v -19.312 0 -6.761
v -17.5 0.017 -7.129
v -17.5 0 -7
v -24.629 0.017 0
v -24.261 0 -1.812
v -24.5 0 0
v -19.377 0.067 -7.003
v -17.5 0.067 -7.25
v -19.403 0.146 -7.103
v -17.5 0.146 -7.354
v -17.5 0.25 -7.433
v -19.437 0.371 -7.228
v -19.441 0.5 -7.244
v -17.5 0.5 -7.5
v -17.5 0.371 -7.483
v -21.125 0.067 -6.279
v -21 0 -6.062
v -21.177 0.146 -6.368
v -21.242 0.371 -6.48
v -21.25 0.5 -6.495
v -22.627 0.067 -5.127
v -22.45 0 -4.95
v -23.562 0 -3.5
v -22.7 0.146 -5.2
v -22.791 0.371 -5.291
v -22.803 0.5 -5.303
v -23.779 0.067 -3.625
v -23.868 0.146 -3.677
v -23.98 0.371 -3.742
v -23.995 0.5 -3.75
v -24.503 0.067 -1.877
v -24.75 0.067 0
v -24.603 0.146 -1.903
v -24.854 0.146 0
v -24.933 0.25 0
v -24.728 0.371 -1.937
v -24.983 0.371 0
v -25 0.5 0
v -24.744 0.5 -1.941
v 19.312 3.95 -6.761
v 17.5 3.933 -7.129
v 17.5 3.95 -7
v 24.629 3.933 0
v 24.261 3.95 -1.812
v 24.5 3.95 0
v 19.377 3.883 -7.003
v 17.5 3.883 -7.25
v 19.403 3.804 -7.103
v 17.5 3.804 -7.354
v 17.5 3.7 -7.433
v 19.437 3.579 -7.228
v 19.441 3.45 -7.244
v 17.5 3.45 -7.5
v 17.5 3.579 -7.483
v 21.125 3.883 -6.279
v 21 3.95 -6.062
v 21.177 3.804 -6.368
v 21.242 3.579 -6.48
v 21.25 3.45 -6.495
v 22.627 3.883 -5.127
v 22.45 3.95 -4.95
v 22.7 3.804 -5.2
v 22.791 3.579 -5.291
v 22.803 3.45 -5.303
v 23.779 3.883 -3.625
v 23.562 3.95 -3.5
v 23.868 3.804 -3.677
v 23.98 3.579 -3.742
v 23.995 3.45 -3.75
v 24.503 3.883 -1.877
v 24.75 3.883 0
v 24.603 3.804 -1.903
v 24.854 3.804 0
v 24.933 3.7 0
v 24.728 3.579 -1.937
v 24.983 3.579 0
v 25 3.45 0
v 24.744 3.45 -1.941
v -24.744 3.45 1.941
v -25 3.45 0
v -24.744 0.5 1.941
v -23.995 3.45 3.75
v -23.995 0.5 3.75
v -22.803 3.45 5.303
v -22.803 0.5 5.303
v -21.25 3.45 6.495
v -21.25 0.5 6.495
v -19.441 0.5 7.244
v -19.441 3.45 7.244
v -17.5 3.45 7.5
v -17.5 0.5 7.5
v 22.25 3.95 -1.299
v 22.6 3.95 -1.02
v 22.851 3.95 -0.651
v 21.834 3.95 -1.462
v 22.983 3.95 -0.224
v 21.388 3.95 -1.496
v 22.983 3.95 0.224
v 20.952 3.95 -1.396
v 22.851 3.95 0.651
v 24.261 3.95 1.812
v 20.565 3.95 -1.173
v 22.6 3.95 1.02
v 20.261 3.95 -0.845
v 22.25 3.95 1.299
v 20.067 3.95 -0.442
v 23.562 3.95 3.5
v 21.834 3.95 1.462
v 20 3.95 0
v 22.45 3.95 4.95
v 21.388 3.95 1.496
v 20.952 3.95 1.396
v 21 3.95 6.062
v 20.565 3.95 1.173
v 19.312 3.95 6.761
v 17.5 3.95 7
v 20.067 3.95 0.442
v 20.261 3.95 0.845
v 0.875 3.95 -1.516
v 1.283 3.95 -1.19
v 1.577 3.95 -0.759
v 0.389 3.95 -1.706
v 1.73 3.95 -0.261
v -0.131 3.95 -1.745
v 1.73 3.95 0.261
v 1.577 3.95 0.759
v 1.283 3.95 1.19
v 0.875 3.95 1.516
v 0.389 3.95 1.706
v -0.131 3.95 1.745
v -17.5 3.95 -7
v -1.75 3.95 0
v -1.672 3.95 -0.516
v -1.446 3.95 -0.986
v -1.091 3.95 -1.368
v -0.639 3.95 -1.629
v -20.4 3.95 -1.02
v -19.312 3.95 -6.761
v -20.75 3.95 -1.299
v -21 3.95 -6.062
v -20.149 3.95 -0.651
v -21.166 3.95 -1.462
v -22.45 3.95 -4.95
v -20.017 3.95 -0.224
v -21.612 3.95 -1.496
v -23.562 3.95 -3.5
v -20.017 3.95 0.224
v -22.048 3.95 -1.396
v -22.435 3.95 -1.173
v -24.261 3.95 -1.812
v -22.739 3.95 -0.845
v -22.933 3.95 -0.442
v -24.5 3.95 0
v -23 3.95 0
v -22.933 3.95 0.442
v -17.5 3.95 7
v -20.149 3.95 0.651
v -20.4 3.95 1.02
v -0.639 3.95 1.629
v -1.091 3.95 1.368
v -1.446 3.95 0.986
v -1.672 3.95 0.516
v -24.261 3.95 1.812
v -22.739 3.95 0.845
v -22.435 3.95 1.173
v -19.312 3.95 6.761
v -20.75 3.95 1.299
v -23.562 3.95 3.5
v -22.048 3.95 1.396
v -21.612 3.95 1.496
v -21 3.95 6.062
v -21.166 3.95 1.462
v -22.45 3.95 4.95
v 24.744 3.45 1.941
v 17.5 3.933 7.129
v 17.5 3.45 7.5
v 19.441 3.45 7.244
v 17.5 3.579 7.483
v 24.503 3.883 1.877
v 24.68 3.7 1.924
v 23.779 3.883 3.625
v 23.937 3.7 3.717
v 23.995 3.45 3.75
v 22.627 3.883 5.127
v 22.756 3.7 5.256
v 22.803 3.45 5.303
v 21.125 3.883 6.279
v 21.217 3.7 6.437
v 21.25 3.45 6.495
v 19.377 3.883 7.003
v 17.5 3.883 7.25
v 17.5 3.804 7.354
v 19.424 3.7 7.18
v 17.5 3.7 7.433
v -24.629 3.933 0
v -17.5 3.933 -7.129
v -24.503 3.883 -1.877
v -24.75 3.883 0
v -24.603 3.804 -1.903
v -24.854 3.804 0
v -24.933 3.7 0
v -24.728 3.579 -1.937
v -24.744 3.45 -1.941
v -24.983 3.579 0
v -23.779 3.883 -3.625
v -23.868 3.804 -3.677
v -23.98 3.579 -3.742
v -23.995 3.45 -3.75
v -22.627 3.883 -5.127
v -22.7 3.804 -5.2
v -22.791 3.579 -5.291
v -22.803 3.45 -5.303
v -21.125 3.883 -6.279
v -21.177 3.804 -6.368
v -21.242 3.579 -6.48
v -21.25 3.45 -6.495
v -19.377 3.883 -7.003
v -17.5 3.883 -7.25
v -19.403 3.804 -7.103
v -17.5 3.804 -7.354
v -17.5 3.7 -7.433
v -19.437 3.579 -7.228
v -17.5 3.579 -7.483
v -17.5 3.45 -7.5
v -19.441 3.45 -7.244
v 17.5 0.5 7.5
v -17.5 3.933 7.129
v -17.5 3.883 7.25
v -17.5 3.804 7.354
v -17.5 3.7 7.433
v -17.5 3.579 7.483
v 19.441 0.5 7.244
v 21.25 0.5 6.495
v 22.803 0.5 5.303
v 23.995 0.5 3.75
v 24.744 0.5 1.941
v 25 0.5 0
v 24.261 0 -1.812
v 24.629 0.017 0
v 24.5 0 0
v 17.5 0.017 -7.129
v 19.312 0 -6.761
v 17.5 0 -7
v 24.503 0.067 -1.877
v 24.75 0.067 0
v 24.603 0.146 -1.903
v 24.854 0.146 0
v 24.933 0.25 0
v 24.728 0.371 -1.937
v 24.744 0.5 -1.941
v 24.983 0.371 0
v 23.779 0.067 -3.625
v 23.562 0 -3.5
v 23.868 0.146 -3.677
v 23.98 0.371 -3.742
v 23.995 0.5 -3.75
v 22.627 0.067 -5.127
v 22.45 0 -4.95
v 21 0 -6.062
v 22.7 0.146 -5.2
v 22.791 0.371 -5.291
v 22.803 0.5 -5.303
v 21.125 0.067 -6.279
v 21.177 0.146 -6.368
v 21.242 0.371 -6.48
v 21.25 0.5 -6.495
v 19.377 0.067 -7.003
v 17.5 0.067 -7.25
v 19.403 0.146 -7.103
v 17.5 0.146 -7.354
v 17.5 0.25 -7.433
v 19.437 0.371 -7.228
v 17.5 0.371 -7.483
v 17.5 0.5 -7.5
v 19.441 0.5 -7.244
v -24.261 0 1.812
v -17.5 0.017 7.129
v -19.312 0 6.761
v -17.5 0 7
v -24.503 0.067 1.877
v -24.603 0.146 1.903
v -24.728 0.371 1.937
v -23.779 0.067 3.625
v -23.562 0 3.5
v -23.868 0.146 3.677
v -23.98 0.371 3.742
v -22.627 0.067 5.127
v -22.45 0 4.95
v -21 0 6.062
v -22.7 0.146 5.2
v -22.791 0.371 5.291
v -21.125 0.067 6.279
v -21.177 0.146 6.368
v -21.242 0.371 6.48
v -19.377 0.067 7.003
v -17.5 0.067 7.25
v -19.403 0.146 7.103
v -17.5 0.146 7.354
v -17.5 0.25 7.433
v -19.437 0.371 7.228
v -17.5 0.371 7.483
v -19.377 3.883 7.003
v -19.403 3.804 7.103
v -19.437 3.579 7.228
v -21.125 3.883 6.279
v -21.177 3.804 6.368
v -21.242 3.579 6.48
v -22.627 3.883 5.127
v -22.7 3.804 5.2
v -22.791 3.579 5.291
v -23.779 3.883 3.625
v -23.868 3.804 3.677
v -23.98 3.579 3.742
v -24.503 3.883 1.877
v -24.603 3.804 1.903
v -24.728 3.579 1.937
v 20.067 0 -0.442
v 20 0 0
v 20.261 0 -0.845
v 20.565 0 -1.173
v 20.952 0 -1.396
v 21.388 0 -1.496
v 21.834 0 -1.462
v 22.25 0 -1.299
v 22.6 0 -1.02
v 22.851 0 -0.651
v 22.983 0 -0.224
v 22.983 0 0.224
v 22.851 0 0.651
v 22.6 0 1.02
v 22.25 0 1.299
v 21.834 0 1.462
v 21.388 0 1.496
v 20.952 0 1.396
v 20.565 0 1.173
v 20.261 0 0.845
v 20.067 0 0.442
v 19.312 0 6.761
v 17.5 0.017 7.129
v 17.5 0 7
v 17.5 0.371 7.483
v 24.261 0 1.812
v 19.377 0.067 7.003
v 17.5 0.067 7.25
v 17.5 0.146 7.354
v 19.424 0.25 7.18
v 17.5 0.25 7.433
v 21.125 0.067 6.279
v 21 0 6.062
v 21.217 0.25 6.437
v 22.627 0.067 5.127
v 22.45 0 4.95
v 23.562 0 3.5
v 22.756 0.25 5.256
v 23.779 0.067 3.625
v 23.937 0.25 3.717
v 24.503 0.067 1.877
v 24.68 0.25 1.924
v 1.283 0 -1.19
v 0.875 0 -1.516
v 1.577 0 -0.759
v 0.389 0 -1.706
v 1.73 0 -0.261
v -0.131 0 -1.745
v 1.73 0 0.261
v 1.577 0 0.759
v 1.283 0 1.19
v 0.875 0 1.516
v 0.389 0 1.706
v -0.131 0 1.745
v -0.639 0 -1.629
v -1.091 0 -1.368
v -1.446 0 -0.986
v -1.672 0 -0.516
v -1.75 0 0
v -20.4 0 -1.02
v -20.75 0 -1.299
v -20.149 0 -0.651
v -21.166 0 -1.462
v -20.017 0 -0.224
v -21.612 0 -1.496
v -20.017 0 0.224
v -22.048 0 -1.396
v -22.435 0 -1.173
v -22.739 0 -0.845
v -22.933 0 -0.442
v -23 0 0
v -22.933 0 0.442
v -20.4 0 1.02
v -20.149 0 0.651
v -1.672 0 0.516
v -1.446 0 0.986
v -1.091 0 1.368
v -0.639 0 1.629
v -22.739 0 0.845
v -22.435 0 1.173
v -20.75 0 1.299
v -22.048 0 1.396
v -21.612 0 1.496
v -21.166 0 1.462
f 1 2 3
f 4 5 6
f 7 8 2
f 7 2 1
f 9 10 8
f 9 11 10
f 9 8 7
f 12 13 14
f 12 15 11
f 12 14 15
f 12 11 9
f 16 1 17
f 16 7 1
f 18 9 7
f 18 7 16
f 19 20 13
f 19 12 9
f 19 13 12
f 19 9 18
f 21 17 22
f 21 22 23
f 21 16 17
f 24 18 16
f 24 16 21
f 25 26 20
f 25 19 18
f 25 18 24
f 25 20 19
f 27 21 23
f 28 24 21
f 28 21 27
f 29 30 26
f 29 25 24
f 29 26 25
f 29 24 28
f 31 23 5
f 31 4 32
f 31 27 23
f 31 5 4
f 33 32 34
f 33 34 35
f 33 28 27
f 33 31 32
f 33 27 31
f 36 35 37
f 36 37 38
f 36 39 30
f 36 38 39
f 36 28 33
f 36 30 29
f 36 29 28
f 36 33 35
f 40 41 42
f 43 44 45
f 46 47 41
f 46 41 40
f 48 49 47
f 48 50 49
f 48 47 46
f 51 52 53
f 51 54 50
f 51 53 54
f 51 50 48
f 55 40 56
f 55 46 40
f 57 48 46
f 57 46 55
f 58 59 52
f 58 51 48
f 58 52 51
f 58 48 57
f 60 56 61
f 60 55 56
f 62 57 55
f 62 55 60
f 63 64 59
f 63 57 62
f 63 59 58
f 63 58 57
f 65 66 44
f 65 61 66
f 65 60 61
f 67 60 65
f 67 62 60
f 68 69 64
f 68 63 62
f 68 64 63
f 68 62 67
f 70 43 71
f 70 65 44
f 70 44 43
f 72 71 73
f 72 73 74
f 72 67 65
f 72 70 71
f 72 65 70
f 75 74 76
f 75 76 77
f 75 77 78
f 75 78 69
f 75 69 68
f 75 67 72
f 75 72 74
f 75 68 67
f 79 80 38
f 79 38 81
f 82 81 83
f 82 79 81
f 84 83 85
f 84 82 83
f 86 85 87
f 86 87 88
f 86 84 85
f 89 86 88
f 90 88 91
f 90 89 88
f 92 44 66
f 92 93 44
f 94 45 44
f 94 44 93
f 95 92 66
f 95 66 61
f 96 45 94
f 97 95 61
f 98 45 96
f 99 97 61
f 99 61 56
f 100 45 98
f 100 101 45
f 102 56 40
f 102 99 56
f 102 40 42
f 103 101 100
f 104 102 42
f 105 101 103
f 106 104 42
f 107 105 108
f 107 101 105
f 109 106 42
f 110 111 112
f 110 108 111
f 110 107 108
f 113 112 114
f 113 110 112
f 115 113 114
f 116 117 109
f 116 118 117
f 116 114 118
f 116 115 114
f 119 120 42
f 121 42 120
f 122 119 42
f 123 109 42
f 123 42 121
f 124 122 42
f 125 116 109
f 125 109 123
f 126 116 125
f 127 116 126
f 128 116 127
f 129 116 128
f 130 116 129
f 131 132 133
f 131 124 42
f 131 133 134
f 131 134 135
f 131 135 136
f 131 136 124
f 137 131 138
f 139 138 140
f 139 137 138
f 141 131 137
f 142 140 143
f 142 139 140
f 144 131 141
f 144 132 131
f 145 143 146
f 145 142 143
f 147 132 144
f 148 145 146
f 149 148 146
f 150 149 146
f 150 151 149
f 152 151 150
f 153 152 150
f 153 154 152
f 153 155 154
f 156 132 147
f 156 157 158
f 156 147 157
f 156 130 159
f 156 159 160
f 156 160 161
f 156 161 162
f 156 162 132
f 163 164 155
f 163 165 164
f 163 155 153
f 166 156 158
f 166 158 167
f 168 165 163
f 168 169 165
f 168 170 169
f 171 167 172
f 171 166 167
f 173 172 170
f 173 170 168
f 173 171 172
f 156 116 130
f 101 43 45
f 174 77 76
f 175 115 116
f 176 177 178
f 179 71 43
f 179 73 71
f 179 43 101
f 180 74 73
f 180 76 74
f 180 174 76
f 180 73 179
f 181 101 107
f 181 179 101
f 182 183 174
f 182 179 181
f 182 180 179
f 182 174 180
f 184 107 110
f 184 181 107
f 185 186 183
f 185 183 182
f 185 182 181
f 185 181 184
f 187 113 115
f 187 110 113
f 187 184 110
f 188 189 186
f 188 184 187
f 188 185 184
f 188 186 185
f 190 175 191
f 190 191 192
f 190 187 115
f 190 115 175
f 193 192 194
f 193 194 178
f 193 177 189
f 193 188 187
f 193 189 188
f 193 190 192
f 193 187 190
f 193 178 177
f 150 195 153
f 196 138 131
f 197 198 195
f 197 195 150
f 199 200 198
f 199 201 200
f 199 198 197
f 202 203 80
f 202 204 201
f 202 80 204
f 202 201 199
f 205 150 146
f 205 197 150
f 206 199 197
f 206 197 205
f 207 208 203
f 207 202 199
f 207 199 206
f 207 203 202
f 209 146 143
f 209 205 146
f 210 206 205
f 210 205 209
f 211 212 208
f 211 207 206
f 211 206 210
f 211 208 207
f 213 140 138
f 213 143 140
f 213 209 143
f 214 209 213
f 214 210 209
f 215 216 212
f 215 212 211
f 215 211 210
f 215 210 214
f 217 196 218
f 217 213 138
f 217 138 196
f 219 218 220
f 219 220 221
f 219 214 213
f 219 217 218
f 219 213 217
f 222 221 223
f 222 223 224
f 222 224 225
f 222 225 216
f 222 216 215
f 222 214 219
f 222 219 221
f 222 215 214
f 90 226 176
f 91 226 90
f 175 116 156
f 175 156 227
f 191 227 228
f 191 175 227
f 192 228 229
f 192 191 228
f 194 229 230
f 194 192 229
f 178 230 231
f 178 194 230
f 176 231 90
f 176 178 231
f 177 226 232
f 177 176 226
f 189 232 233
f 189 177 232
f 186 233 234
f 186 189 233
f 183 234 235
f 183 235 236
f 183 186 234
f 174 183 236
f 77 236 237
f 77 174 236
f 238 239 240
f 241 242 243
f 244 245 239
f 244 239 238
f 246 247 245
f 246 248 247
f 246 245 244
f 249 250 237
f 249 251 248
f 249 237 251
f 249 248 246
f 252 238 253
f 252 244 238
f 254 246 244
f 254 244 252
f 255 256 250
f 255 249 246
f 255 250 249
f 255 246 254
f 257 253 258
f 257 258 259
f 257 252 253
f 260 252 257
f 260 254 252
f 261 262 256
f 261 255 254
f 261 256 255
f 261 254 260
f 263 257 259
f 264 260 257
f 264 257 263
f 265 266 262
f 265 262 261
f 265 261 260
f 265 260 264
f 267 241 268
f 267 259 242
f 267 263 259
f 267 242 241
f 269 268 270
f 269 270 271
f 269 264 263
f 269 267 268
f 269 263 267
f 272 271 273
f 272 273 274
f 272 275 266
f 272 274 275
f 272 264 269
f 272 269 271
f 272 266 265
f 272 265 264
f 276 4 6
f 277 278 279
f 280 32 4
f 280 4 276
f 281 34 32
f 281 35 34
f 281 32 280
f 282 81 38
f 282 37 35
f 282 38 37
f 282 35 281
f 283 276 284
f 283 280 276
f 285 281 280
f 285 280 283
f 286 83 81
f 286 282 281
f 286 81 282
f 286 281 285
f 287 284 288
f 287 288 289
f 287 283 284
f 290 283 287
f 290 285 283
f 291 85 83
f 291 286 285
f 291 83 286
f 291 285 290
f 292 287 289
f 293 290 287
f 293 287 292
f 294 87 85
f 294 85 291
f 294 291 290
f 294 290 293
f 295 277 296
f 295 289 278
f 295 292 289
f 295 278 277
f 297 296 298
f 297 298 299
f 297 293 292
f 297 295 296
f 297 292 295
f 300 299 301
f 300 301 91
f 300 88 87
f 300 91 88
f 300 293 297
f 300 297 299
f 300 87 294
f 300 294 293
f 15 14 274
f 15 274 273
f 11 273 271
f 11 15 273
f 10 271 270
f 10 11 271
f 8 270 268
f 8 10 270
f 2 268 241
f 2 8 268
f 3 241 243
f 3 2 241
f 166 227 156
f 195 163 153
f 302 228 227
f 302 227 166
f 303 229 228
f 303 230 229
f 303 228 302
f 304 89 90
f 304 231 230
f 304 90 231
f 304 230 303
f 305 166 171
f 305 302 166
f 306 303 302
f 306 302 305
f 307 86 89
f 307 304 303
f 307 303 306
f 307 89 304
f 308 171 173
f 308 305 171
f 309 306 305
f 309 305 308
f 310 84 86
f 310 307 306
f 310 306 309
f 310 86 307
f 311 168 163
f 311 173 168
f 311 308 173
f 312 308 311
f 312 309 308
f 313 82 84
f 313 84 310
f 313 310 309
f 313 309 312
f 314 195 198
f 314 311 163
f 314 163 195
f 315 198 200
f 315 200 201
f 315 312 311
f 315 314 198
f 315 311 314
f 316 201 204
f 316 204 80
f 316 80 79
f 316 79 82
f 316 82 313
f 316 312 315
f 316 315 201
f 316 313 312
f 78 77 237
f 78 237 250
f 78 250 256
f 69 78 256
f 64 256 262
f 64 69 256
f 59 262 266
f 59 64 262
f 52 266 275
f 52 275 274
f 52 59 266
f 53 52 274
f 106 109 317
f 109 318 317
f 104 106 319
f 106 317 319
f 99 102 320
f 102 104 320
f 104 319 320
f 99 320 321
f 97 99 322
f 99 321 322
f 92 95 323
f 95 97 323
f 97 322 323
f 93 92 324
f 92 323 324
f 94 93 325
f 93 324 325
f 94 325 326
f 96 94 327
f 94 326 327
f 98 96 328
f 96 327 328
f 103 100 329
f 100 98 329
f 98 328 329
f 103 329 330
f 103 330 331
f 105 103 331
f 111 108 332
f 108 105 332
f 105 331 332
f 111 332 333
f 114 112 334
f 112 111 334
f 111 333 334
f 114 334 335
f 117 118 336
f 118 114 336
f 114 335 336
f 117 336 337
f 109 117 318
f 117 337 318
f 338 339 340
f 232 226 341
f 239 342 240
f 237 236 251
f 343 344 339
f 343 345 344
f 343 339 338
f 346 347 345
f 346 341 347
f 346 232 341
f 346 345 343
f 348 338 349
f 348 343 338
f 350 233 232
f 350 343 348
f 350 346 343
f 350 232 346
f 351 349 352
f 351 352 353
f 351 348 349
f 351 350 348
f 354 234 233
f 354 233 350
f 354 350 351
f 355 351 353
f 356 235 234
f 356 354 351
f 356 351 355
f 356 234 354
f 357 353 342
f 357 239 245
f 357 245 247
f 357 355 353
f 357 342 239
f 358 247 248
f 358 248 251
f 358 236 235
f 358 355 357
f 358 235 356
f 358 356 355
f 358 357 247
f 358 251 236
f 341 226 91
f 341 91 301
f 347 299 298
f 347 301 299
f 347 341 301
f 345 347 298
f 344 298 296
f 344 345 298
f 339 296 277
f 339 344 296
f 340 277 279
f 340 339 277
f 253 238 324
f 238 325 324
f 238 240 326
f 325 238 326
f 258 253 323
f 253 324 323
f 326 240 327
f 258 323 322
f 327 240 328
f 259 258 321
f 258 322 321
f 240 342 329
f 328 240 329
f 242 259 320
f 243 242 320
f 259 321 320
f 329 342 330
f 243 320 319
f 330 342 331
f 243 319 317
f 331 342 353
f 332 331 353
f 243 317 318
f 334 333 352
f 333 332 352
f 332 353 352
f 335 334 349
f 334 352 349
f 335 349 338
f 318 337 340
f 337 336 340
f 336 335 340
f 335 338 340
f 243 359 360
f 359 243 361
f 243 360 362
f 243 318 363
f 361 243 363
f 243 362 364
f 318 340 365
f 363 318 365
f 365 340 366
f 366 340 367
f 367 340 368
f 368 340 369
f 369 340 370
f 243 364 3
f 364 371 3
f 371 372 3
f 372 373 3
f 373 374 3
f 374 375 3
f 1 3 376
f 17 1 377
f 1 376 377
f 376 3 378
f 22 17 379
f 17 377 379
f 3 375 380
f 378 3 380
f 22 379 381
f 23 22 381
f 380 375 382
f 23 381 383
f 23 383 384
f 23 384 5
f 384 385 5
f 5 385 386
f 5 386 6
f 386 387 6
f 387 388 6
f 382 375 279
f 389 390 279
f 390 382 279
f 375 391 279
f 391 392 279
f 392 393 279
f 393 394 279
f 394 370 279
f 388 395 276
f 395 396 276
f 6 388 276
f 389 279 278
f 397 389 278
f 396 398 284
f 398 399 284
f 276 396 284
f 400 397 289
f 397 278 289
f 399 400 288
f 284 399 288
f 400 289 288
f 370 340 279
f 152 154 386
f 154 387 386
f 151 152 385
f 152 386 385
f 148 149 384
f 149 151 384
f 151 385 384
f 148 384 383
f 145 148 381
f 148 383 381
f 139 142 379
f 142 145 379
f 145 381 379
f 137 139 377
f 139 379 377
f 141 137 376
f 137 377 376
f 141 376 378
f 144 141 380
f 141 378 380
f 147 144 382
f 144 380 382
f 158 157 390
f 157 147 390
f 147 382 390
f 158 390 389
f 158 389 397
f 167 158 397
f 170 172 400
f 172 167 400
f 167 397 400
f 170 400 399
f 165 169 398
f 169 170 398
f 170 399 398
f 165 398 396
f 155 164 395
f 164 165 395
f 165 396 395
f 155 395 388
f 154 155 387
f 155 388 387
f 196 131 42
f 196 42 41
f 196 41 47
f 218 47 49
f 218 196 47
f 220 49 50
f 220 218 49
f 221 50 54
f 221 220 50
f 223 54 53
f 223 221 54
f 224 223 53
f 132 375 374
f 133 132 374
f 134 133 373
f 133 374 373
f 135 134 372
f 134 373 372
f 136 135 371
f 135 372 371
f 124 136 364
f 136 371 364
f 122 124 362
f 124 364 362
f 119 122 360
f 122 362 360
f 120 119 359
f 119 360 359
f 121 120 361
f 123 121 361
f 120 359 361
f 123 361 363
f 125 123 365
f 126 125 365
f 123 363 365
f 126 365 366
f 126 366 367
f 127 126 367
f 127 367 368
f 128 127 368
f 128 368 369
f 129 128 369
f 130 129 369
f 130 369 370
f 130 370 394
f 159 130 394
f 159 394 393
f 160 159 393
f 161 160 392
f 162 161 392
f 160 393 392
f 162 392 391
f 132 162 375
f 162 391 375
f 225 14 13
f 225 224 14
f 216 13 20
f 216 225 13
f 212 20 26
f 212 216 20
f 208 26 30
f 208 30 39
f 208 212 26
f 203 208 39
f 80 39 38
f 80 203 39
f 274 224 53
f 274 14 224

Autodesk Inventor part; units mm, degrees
ref_plane "YZ Plane" through (0, 0, 0) normal (1, 0, 0) x (0, 1, 0)
ref_plane "XZ Plane" through (0, 0, 0) normal (0, 1, 0) x (-1, 0, 0)
ref_plane "XY Plane" through (0, 0, 0) normal (0, 0, 1) x (1, 0, 0)
sketch "Sketch1" plane through (0, 0, 0) normal (0, 1, 0) x (-1, 0, 0)
  line L0 (25, -7.5) -> (-25, -7.5)
  line L1 (-25, -7.5) -> (-25, 7.5)
  line L2 (-25, 7.5) -> (25, 7.5)
  line L3 (25, 7.5) -> (25, -7.5)
  circle A0 centre (0, 0) radius 1.75
  circle A1 centre (-21.5, 0) radius 1.5
  line L4 (0, 11.4467) -> (0, -17.1004)
  circle A2 centre (21.5, 0) radius 1.5
  point P0 (0, -7.5)
  dimension "d0" = 15
  dimension "d1" = 50
  dimension "d2" = 25
  dimension "d3" = 3.5
  dimension "d4" = 7.5
  dimension "d7" = 3
  dimension "d9" = 7.5
  dimension "d10" = 2
extrude "Extrusion2" add sketch "Sketch1" along normal blind 3.95 contours L0 L4 A0 L2 L3 | L0 L1 L2 L4 A0
fillet "Fillet1" radius 7.5 4 edges at (25, 1.975, 7.5) (25, 1.975, -7.5) (-25, 1.975, 7.5) (-25, 1.975, -7.5)
fillet "Fillet2" radius 0.5 8 edges at (22.8033, 3.95, 5.3033) (0, 3.95, -7.5) (-22.8033, 3.95, 5.3033) (0, 3.95, 7.5) (22.8033, 0, 5.3033) (0, 0, -7.5) (-22.8033, 0, 5.3033) (0, 0, 7.5)
properties part number "PropConnector"
